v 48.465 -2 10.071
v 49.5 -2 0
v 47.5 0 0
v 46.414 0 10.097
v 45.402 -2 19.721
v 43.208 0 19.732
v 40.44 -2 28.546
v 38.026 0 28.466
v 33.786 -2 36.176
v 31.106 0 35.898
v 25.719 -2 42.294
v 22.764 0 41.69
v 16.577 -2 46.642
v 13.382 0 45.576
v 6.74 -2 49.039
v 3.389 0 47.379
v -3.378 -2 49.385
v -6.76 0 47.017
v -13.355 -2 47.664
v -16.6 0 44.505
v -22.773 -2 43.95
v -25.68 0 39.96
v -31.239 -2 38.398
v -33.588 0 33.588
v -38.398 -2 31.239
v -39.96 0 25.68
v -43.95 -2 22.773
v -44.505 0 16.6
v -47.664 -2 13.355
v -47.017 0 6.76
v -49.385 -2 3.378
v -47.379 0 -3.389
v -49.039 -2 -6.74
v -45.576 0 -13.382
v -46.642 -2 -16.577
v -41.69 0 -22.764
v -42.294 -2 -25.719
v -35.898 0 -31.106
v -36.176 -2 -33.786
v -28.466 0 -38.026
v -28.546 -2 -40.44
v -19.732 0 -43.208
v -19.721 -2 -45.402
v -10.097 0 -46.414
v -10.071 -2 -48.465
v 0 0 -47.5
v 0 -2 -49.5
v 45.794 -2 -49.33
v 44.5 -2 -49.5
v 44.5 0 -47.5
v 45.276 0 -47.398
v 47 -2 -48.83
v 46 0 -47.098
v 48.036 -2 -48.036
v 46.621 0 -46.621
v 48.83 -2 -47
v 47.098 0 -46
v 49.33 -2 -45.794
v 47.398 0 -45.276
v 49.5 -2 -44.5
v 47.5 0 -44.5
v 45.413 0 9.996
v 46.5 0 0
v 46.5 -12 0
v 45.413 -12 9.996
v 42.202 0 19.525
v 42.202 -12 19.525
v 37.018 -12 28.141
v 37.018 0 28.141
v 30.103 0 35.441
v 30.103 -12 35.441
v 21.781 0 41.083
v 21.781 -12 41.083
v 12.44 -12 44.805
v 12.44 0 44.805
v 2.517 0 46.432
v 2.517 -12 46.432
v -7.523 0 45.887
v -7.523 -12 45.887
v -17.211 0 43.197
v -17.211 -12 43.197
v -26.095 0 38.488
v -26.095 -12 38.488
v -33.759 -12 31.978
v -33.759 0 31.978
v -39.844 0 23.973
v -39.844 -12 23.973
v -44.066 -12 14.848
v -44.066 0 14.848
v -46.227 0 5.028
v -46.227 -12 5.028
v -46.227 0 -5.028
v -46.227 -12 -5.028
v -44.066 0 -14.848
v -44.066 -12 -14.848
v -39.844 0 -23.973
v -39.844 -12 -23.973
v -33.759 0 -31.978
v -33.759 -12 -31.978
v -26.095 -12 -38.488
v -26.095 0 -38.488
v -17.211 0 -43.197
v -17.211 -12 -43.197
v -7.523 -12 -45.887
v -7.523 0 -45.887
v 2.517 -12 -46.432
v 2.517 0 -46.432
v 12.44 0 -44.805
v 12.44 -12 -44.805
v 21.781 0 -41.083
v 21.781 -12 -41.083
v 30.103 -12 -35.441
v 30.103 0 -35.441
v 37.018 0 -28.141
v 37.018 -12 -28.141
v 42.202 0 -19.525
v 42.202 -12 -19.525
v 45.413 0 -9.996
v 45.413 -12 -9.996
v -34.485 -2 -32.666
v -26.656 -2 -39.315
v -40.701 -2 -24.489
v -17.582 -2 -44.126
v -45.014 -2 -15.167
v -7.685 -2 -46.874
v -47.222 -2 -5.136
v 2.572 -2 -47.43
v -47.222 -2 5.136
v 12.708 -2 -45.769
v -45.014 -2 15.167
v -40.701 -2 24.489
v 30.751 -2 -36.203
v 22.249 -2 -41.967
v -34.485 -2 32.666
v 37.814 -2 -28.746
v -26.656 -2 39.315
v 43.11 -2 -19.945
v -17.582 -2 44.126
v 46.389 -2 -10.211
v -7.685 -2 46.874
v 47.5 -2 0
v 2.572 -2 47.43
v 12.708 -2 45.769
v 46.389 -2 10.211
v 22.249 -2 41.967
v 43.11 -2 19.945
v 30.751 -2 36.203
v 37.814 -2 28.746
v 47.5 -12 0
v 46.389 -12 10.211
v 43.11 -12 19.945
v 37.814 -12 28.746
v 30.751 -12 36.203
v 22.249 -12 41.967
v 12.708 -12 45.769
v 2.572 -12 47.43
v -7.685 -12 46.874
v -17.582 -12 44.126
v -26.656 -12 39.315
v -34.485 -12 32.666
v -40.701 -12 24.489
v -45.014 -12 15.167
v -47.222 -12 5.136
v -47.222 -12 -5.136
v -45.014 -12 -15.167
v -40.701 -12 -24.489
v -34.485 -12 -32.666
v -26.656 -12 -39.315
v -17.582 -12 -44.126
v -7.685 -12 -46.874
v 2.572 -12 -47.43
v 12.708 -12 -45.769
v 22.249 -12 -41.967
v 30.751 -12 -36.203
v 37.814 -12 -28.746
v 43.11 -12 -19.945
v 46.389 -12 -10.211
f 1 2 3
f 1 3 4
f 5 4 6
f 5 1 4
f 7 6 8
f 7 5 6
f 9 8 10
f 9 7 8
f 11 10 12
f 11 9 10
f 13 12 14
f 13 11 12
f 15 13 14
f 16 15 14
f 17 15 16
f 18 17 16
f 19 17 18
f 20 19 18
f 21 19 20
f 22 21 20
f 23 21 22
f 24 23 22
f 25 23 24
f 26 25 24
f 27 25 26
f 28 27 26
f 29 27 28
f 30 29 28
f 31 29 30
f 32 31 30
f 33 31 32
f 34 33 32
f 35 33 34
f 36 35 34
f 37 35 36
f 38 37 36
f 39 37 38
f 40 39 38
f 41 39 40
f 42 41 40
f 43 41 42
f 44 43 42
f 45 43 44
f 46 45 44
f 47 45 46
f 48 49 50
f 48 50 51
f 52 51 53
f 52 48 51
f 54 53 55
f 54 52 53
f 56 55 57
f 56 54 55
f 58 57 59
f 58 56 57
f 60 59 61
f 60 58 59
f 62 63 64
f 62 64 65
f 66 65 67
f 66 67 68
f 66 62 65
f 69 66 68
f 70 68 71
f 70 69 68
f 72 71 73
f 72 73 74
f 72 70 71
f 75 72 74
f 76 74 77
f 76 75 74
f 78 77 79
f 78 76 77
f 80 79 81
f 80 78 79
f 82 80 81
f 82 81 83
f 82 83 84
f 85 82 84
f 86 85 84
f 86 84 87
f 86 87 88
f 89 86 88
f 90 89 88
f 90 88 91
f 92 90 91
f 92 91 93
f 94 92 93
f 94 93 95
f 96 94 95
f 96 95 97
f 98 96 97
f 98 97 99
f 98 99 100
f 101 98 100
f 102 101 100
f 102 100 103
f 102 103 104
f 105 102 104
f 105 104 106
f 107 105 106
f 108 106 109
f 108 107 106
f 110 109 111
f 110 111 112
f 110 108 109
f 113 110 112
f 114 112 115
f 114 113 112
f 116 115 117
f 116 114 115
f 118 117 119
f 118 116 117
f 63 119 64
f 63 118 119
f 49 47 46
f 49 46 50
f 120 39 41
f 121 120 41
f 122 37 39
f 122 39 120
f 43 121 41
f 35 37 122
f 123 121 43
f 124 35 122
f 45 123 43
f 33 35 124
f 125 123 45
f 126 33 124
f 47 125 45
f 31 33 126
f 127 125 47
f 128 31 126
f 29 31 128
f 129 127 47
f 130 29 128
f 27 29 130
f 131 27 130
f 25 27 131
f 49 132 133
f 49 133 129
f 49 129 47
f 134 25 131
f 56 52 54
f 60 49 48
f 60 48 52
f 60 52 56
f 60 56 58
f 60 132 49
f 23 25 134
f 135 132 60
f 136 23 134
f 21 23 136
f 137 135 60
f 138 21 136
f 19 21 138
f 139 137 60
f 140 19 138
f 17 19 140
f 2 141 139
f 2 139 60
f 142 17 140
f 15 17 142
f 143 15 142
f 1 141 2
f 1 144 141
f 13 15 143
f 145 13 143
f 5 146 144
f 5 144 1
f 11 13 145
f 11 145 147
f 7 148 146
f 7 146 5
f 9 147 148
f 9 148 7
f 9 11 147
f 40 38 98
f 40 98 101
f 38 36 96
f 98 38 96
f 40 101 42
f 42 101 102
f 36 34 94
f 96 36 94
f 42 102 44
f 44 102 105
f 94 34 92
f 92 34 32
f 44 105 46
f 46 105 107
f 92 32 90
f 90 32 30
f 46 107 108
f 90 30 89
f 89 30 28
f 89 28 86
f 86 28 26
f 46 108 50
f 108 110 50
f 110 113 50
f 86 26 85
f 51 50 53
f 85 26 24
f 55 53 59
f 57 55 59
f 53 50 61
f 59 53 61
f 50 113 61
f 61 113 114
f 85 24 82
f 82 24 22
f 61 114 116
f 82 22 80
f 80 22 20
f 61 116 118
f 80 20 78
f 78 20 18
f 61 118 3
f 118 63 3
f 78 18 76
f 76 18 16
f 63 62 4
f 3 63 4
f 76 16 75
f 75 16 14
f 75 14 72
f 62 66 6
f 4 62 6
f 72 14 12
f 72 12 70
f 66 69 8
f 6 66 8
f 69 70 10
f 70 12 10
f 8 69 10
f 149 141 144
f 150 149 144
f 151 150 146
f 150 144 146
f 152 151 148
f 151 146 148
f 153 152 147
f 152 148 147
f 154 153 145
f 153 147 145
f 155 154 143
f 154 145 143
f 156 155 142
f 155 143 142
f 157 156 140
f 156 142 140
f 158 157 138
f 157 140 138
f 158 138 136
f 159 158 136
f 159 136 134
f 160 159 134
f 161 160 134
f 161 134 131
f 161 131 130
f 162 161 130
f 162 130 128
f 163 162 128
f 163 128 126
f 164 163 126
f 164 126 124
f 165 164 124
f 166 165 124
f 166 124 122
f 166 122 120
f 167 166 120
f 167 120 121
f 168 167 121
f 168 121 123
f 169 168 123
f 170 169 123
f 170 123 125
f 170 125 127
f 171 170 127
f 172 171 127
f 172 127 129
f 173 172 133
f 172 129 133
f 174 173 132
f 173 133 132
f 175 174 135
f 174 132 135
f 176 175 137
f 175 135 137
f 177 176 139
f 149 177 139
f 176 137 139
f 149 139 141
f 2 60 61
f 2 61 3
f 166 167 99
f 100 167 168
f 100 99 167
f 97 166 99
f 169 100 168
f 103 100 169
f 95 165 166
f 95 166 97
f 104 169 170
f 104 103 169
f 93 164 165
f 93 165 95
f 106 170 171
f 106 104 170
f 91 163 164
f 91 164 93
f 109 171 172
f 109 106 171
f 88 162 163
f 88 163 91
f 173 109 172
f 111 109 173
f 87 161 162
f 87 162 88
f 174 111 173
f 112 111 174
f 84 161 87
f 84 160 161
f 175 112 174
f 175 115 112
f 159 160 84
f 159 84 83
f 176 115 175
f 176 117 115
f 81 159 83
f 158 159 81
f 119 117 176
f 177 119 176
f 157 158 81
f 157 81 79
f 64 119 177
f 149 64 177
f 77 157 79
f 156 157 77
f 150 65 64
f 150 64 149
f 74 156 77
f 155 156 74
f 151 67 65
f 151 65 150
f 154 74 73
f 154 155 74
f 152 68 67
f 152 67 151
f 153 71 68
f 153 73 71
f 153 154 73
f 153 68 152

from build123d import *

# Parameters (mm, degrees)
F0_R     = 47.5
F0_R_2   = 46.5
F1_DEPTH = 2
F2_DEPTH = 12
F3_SIZE  = 1.99999


# Not quite as in the source:
# - a fillet or chamfer is up to 0.001 mm smaller than in the source, because OpenCascade refuses the exact size


with BuildPart() as f1:
    # F0 (on Front) → F1 (new body)
    with BuildSketch(Plane.XZ):
        with BuildLine():
            ThreePointArc((0, -49.5), (35.0017856687, -35.0017856687), (49.5, 0))
            ThreePointArc((49.5, 0), (-35.0017856687, 35.0017856687), (0, -49.5))
        make_face()
        Circle(F0_R, mode=Mode.SUBTRACT)
        Circle(F0_R)
        Circle(F0_R_2, mode=Mode.SUBTRACT)
        with BuildLine():
            Line((49.5, -44.5), (49.5, 0))
            ThreePointArc((49.5, 0), (35.0017856687, -35.0017856687), (0, -49.5))
            Line((0, -49.5), (44.5, -49.5))
            ThreePointArc((44.5, -49.5), (48.0355339059, -48.0355339059), (49.5, -44.5))
        make_face()
    extrude(amount=F1_DEPTH)

    # F0 (on Front) → F2 (join)
    with BuildSketch(Plane.XZ):
        Circle(F0_R)
        Circle(F0_R_2, mode=Mode.SUBTRACT)
    extrude(amount=F2_DEPTH)

    # F3 (size 2 in the source; OpenCascade refuses exactly that, so slightly less here)
    f3_edges = [f1.edges().sort_by_distance(p)[0] for p in [
        (49.5, 0, -22.25),
    ]]
    chamfer(f3_edges, length=F3_SIZE)


solid = f1.part
